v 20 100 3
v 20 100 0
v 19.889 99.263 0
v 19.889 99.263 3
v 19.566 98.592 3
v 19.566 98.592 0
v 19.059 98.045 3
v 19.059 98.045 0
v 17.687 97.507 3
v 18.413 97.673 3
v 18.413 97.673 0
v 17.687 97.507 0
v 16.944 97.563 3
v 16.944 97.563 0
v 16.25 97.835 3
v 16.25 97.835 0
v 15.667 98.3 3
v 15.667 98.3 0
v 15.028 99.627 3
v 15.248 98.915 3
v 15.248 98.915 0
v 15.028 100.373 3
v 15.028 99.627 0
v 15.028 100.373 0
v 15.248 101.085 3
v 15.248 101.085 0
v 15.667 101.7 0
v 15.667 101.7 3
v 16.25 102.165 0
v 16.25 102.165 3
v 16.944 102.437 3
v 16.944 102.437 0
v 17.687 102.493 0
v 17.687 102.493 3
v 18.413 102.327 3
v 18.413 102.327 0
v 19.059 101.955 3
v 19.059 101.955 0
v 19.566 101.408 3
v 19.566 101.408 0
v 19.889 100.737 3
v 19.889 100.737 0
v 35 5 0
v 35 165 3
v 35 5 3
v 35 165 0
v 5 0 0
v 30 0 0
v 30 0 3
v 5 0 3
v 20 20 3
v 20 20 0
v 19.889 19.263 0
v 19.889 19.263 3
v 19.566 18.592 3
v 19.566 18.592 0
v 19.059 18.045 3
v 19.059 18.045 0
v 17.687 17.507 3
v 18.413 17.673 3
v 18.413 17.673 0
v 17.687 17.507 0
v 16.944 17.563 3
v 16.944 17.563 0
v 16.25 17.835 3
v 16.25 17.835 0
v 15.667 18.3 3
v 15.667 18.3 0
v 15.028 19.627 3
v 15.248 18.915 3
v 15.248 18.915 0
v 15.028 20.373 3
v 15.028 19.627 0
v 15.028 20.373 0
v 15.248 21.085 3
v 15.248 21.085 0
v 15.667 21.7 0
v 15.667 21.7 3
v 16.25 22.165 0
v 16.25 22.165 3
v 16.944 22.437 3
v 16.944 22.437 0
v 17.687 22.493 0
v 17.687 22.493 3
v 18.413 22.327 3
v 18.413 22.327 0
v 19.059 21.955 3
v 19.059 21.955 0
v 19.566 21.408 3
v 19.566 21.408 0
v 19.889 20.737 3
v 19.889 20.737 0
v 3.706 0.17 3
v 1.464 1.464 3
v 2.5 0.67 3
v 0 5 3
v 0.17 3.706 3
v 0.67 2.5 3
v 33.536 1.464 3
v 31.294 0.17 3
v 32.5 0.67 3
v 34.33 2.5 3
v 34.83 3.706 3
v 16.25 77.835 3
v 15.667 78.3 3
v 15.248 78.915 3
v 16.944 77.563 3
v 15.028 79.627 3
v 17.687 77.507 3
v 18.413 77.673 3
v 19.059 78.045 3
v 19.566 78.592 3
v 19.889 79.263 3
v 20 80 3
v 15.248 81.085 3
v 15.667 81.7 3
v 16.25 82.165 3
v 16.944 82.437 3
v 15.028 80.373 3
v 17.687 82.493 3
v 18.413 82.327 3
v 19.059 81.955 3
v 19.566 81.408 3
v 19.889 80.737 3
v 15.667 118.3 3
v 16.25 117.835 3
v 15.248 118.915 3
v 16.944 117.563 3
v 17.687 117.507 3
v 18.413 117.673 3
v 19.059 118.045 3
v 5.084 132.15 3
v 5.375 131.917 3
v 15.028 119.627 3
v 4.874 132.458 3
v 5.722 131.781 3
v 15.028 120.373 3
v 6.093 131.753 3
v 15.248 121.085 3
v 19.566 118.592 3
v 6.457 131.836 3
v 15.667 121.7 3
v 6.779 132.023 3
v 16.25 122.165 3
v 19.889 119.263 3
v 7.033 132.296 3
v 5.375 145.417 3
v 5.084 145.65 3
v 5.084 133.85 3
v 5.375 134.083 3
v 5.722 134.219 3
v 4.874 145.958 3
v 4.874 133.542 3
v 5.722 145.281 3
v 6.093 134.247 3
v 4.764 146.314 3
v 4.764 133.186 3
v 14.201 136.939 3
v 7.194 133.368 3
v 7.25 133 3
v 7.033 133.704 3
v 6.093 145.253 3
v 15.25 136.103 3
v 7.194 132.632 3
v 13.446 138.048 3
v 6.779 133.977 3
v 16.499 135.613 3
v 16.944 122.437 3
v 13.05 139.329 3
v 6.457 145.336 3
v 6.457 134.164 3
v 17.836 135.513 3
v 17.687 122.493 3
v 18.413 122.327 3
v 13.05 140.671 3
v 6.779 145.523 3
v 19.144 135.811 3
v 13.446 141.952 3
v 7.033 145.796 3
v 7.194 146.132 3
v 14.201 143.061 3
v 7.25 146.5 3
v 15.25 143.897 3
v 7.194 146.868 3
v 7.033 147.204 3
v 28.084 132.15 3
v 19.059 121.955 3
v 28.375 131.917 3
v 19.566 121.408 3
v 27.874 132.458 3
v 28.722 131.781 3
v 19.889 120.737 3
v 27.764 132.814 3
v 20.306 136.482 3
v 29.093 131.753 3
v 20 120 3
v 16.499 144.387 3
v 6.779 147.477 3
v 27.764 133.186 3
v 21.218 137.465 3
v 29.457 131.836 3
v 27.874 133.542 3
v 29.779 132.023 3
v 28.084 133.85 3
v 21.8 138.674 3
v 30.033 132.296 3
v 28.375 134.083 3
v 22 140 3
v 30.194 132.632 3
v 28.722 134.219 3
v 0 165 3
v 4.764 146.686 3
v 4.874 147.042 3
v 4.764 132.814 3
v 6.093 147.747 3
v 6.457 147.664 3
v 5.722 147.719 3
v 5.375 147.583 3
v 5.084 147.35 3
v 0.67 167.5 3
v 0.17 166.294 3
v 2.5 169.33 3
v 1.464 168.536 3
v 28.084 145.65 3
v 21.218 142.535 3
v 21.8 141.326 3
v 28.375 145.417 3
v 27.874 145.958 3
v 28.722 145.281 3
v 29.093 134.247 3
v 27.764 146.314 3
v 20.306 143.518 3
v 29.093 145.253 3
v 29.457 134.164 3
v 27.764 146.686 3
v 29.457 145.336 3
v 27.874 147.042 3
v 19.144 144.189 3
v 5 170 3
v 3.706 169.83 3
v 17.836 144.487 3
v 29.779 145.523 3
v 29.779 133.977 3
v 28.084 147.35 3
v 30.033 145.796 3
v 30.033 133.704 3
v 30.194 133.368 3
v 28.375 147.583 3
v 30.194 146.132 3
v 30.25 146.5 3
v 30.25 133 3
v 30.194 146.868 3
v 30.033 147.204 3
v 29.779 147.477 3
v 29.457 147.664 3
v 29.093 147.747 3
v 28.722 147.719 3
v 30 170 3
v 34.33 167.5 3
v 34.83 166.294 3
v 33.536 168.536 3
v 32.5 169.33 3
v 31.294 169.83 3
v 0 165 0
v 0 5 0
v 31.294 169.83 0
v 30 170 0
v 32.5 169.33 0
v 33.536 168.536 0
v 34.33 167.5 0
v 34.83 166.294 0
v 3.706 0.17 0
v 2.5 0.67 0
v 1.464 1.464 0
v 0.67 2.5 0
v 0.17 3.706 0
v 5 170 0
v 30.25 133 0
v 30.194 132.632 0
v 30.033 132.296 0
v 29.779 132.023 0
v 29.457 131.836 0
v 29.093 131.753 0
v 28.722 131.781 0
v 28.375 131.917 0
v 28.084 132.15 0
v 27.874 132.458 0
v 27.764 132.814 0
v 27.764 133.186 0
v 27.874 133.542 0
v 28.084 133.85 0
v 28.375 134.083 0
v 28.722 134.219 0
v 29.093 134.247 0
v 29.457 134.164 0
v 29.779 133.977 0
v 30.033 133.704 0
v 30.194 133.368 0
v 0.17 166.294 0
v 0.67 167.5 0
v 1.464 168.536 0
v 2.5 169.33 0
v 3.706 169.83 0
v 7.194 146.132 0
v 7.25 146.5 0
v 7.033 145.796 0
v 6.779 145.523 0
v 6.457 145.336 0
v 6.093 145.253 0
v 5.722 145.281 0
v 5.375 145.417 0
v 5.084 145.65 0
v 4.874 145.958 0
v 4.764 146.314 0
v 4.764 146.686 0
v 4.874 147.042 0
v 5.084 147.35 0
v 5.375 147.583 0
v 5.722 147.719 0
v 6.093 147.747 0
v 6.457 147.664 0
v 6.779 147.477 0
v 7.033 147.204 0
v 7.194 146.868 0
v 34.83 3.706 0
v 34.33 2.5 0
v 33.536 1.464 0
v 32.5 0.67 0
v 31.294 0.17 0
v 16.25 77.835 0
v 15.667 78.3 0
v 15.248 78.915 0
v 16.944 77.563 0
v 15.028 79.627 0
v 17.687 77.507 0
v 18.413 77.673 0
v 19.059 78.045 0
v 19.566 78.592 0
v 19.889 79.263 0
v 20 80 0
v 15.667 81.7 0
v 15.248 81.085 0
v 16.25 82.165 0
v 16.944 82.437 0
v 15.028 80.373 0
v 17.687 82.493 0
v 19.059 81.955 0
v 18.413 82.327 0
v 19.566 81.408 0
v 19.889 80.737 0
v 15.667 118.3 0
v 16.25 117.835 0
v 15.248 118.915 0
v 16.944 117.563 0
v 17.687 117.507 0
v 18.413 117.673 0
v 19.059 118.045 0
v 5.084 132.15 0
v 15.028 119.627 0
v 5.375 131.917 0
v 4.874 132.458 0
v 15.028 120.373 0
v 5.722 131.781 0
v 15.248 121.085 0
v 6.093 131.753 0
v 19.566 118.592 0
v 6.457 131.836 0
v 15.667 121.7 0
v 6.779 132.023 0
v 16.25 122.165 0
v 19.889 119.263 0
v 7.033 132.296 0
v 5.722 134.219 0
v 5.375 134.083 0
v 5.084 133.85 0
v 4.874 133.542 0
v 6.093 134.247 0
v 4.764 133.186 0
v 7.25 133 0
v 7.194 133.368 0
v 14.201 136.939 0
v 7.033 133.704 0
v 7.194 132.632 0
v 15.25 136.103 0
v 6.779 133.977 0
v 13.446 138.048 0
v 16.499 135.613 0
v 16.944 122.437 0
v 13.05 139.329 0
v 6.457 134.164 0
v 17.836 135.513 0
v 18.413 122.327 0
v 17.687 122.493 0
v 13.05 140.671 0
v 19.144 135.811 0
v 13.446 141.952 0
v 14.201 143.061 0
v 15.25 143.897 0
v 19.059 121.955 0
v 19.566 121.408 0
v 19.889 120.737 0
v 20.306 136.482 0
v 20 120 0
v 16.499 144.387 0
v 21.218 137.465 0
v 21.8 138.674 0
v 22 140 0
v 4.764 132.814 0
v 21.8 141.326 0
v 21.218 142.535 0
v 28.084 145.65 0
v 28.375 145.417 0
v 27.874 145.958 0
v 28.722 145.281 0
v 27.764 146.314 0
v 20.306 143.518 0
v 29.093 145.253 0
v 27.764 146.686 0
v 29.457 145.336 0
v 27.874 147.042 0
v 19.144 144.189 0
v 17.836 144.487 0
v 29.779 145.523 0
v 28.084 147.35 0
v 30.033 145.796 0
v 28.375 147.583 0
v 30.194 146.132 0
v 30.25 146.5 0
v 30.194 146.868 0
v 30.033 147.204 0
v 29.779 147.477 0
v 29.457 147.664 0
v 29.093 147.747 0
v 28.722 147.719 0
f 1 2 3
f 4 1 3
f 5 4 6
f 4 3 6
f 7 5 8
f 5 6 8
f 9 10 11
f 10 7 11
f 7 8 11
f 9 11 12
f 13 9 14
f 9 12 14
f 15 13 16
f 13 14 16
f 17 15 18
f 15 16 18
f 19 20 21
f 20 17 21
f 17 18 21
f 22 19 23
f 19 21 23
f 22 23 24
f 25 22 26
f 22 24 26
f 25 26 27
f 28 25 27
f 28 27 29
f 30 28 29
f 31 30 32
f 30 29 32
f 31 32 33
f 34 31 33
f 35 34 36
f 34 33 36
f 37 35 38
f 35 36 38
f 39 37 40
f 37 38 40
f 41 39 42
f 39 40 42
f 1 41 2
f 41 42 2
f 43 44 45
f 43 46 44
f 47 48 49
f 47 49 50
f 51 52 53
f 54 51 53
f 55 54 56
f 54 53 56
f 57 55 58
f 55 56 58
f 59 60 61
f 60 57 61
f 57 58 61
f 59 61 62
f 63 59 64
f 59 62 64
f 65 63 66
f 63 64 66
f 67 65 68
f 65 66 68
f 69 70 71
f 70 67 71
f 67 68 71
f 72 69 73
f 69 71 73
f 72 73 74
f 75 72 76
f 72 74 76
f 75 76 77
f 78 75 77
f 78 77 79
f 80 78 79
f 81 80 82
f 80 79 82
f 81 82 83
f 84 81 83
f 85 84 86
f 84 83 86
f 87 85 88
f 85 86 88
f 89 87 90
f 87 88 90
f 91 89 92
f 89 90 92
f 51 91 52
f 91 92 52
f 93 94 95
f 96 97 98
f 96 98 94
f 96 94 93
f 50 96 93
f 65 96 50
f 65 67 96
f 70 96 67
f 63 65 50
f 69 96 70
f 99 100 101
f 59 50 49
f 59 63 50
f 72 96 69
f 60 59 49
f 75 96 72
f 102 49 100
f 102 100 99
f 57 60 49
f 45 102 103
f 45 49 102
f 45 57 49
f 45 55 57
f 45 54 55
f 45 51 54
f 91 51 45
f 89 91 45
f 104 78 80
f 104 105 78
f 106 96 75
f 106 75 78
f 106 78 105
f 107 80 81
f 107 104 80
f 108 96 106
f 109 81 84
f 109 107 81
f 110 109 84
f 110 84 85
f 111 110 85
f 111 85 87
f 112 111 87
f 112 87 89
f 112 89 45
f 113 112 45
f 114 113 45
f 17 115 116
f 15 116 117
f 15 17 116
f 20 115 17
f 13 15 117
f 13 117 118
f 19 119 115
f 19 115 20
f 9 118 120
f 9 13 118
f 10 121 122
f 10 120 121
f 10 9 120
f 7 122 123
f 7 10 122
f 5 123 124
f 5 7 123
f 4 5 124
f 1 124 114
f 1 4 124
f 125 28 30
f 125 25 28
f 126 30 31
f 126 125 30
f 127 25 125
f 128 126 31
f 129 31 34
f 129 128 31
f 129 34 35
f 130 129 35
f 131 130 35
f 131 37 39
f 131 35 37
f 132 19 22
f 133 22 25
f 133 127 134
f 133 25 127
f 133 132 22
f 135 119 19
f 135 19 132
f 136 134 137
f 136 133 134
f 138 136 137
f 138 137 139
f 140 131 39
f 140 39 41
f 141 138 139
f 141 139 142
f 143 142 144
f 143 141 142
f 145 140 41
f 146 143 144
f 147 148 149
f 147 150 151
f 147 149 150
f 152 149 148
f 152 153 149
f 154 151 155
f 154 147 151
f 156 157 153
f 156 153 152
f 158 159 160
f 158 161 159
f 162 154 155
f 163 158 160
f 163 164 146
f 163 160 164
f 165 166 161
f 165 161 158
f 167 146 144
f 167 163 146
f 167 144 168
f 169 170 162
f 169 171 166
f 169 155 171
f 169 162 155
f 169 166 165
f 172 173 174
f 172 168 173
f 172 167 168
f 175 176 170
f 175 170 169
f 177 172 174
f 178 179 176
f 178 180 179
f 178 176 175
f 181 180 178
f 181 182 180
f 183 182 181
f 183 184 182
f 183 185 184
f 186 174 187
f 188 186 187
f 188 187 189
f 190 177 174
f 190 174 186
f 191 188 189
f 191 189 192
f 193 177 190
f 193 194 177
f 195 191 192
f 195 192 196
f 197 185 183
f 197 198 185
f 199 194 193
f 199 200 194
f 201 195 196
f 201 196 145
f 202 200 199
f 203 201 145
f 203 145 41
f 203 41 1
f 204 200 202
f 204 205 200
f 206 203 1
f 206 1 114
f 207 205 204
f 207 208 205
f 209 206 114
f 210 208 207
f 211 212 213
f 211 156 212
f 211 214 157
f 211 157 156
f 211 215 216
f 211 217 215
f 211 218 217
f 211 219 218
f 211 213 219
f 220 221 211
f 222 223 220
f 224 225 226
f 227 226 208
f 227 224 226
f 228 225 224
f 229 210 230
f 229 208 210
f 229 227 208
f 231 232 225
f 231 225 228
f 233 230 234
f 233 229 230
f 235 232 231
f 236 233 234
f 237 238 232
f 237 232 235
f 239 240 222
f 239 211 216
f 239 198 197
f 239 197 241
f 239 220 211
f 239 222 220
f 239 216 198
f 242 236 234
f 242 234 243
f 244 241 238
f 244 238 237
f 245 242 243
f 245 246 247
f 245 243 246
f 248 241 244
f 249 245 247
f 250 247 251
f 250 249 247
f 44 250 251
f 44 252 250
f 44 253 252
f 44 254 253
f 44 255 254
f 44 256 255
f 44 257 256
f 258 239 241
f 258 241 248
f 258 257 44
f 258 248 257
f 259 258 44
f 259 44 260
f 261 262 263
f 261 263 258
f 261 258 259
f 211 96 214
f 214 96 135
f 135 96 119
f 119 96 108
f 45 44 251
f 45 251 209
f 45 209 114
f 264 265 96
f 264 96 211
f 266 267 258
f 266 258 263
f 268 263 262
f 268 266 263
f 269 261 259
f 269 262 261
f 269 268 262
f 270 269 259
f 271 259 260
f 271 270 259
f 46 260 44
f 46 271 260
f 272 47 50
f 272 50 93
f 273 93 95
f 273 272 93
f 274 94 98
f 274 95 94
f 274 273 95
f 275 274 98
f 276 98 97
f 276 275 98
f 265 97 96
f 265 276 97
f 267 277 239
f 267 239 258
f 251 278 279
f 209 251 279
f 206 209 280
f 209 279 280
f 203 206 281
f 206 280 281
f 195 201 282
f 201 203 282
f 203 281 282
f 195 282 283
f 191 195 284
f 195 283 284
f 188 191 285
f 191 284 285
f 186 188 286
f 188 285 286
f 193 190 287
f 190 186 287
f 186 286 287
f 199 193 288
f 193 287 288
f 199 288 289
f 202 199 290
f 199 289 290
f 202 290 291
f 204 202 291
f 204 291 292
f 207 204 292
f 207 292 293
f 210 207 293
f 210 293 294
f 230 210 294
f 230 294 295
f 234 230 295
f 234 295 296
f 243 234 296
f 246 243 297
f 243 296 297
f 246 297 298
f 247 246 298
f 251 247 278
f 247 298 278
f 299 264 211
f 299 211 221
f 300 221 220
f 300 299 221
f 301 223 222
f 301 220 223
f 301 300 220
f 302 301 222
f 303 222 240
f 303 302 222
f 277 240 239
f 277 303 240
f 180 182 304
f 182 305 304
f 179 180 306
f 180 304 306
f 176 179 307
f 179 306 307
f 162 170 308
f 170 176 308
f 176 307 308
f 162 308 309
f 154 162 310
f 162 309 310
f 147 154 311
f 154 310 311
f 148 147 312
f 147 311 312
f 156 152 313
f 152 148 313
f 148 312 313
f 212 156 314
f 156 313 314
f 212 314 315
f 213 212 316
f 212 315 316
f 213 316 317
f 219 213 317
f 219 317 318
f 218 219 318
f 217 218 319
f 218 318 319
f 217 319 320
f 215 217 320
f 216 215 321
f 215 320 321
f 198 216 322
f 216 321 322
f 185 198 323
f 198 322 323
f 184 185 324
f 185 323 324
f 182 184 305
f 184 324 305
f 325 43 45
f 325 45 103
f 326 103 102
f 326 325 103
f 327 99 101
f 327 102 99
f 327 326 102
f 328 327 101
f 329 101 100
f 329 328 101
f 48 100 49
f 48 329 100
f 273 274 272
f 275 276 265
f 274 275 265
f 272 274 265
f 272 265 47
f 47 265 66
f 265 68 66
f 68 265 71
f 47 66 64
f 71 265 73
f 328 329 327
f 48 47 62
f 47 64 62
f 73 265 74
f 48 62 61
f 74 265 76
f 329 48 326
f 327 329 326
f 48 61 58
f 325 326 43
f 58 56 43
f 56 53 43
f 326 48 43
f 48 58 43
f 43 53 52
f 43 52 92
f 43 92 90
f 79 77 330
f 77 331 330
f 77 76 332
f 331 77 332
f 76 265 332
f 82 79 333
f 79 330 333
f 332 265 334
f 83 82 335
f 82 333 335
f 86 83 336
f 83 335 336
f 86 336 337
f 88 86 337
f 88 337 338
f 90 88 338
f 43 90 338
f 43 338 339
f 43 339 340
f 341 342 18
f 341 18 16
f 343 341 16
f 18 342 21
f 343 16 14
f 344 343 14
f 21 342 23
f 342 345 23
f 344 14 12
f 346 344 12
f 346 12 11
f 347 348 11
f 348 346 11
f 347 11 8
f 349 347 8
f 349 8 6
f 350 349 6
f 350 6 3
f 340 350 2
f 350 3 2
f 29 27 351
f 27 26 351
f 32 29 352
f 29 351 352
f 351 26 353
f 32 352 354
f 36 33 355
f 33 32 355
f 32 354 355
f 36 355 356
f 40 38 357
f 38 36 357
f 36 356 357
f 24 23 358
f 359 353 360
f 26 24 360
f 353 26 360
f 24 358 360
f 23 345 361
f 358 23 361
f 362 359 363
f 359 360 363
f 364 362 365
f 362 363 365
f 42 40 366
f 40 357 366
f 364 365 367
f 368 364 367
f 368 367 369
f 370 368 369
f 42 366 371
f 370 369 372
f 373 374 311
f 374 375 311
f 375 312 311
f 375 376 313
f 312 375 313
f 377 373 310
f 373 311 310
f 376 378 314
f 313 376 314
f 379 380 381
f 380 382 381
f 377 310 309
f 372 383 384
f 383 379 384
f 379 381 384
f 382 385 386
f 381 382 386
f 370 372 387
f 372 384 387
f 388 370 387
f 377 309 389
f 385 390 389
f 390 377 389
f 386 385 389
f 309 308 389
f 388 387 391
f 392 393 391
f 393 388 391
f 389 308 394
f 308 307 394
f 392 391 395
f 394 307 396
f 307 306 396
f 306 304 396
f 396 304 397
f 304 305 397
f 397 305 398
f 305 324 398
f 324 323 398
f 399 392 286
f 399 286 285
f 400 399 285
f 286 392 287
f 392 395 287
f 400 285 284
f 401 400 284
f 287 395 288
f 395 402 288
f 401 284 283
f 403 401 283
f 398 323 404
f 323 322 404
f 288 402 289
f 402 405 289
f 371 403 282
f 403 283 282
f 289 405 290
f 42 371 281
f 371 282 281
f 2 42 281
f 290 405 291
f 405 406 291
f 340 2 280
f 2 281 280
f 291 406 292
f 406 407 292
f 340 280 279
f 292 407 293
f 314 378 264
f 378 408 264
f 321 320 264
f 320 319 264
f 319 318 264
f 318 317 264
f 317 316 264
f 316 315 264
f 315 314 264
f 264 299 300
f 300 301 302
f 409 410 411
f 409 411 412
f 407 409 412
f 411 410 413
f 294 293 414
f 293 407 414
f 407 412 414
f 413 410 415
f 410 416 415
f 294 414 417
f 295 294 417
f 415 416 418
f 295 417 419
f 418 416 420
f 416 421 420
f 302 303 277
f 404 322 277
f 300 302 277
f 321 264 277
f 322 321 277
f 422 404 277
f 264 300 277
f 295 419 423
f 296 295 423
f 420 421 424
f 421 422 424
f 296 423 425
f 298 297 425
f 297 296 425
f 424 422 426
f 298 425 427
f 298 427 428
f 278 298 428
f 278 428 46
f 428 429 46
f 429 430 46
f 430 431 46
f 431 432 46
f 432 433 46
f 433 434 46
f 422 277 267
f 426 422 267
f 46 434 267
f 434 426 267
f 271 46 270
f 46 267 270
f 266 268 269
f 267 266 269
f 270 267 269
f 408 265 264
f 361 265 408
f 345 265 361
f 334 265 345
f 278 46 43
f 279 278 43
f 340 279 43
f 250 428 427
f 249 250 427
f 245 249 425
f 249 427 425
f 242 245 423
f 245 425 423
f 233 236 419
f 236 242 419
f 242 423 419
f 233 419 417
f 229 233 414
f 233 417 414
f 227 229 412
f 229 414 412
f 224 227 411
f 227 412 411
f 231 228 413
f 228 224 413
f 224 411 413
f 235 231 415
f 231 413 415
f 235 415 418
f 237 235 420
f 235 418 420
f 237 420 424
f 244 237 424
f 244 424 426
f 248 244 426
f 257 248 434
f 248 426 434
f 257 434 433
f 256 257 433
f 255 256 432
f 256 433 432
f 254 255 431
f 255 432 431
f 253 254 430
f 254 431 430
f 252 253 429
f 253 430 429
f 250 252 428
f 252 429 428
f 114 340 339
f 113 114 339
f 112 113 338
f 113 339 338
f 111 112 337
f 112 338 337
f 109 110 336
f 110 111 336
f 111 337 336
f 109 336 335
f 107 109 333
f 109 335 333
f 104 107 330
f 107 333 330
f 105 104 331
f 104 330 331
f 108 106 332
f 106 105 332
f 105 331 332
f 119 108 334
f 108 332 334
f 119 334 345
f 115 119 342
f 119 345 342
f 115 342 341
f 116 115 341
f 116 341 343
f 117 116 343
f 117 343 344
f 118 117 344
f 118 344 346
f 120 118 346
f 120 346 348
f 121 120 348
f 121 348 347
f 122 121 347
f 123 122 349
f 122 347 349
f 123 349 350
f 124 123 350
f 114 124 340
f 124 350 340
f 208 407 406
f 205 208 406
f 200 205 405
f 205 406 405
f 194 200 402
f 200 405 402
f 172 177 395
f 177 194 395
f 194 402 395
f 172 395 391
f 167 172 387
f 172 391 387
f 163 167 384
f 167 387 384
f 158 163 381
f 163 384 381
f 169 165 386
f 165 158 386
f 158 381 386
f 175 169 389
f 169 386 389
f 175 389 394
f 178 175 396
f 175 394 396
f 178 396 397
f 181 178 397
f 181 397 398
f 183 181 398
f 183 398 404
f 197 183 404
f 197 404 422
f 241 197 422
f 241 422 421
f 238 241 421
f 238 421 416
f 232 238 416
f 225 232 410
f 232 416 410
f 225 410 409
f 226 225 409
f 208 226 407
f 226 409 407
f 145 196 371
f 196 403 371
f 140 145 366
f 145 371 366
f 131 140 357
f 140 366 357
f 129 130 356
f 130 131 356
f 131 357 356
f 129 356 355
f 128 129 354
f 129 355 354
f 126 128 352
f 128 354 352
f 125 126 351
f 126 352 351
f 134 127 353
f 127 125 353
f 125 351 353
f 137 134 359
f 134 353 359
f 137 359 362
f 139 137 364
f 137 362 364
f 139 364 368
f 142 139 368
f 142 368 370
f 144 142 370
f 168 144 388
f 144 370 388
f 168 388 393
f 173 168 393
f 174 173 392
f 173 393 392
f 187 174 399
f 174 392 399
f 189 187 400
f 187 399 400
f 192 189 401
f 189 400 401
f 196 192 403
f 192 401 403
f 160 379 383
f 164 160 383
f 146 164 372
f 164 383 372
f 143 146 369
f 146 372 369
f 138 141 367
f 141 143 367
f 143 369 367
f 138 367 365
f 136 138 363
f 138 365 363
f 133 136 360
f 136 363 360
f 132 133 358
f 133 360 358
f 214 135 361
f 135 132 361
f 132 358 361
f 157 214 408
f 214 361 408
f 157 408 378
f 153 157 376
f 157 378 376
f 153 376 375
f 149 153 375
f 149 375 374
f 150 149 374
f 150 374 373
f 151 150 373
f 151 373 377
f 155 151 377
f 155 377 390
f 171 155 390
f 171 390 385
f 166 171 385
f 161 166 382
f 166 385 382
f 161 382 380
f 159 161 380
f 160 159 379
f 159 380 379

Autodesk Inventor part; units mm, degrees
ref_plane "YZ Plane" through (0, 0, 0) normal (1, 0, 0) x (0, 1, 0)
ref_plane "XZ Plane" through (0, 0, 0) normal (0, 1, 0) x (-1, 0, 0)
ref_plane "XY Plane" through (0, 0, 0) normal (0, 0, 1) x (1, 0, 0)
sketch "Boceto1" plane through (0, 0, 0) normal (0, 0, 1) x (1, 0, 0)
  line L0 (0, 5) -> (0, 165)
  line L1 (5, 170) -> (30, 170)
  line L2 (35, 165) -> (35, 5)
  line L3 (30, 0) -> (5, 0)
  arc A0 (35, 165) -> (30, 170) centre (30, 165) ccw
  arc A1 (5, 170) -> (0, 165) centre (5, 165) ccw
  arc A2 (0, 5) -> (5, 0) centre (5, 5) ccw
  arc A3 (30, 0) -> (35, 5) centre (30, 5) ccw
  circle A4 centre (17.5, 140) radius 4.5
  circle A5 centre (17.5, 120) radius 2.5
  circle A6 centre (17.5, 100) radius 2.5
  circle A7 centre (17.5, 80) radius 2.5
  circle A8 centre (17.5, 20) radius 2.5
  circle A9 centre (6, 133) radius 1.25
  circle A10 centre (6, 146.5) radius 1.25
  circle A11 centre (29, 146.5) radius 1.25
  circle A12 centre (29, 133) radius 1.25
  point P0 (0, 0)
extrude "Extrusión1" add sketch "Boceto1" along normal blind 3
properties part number "2"
